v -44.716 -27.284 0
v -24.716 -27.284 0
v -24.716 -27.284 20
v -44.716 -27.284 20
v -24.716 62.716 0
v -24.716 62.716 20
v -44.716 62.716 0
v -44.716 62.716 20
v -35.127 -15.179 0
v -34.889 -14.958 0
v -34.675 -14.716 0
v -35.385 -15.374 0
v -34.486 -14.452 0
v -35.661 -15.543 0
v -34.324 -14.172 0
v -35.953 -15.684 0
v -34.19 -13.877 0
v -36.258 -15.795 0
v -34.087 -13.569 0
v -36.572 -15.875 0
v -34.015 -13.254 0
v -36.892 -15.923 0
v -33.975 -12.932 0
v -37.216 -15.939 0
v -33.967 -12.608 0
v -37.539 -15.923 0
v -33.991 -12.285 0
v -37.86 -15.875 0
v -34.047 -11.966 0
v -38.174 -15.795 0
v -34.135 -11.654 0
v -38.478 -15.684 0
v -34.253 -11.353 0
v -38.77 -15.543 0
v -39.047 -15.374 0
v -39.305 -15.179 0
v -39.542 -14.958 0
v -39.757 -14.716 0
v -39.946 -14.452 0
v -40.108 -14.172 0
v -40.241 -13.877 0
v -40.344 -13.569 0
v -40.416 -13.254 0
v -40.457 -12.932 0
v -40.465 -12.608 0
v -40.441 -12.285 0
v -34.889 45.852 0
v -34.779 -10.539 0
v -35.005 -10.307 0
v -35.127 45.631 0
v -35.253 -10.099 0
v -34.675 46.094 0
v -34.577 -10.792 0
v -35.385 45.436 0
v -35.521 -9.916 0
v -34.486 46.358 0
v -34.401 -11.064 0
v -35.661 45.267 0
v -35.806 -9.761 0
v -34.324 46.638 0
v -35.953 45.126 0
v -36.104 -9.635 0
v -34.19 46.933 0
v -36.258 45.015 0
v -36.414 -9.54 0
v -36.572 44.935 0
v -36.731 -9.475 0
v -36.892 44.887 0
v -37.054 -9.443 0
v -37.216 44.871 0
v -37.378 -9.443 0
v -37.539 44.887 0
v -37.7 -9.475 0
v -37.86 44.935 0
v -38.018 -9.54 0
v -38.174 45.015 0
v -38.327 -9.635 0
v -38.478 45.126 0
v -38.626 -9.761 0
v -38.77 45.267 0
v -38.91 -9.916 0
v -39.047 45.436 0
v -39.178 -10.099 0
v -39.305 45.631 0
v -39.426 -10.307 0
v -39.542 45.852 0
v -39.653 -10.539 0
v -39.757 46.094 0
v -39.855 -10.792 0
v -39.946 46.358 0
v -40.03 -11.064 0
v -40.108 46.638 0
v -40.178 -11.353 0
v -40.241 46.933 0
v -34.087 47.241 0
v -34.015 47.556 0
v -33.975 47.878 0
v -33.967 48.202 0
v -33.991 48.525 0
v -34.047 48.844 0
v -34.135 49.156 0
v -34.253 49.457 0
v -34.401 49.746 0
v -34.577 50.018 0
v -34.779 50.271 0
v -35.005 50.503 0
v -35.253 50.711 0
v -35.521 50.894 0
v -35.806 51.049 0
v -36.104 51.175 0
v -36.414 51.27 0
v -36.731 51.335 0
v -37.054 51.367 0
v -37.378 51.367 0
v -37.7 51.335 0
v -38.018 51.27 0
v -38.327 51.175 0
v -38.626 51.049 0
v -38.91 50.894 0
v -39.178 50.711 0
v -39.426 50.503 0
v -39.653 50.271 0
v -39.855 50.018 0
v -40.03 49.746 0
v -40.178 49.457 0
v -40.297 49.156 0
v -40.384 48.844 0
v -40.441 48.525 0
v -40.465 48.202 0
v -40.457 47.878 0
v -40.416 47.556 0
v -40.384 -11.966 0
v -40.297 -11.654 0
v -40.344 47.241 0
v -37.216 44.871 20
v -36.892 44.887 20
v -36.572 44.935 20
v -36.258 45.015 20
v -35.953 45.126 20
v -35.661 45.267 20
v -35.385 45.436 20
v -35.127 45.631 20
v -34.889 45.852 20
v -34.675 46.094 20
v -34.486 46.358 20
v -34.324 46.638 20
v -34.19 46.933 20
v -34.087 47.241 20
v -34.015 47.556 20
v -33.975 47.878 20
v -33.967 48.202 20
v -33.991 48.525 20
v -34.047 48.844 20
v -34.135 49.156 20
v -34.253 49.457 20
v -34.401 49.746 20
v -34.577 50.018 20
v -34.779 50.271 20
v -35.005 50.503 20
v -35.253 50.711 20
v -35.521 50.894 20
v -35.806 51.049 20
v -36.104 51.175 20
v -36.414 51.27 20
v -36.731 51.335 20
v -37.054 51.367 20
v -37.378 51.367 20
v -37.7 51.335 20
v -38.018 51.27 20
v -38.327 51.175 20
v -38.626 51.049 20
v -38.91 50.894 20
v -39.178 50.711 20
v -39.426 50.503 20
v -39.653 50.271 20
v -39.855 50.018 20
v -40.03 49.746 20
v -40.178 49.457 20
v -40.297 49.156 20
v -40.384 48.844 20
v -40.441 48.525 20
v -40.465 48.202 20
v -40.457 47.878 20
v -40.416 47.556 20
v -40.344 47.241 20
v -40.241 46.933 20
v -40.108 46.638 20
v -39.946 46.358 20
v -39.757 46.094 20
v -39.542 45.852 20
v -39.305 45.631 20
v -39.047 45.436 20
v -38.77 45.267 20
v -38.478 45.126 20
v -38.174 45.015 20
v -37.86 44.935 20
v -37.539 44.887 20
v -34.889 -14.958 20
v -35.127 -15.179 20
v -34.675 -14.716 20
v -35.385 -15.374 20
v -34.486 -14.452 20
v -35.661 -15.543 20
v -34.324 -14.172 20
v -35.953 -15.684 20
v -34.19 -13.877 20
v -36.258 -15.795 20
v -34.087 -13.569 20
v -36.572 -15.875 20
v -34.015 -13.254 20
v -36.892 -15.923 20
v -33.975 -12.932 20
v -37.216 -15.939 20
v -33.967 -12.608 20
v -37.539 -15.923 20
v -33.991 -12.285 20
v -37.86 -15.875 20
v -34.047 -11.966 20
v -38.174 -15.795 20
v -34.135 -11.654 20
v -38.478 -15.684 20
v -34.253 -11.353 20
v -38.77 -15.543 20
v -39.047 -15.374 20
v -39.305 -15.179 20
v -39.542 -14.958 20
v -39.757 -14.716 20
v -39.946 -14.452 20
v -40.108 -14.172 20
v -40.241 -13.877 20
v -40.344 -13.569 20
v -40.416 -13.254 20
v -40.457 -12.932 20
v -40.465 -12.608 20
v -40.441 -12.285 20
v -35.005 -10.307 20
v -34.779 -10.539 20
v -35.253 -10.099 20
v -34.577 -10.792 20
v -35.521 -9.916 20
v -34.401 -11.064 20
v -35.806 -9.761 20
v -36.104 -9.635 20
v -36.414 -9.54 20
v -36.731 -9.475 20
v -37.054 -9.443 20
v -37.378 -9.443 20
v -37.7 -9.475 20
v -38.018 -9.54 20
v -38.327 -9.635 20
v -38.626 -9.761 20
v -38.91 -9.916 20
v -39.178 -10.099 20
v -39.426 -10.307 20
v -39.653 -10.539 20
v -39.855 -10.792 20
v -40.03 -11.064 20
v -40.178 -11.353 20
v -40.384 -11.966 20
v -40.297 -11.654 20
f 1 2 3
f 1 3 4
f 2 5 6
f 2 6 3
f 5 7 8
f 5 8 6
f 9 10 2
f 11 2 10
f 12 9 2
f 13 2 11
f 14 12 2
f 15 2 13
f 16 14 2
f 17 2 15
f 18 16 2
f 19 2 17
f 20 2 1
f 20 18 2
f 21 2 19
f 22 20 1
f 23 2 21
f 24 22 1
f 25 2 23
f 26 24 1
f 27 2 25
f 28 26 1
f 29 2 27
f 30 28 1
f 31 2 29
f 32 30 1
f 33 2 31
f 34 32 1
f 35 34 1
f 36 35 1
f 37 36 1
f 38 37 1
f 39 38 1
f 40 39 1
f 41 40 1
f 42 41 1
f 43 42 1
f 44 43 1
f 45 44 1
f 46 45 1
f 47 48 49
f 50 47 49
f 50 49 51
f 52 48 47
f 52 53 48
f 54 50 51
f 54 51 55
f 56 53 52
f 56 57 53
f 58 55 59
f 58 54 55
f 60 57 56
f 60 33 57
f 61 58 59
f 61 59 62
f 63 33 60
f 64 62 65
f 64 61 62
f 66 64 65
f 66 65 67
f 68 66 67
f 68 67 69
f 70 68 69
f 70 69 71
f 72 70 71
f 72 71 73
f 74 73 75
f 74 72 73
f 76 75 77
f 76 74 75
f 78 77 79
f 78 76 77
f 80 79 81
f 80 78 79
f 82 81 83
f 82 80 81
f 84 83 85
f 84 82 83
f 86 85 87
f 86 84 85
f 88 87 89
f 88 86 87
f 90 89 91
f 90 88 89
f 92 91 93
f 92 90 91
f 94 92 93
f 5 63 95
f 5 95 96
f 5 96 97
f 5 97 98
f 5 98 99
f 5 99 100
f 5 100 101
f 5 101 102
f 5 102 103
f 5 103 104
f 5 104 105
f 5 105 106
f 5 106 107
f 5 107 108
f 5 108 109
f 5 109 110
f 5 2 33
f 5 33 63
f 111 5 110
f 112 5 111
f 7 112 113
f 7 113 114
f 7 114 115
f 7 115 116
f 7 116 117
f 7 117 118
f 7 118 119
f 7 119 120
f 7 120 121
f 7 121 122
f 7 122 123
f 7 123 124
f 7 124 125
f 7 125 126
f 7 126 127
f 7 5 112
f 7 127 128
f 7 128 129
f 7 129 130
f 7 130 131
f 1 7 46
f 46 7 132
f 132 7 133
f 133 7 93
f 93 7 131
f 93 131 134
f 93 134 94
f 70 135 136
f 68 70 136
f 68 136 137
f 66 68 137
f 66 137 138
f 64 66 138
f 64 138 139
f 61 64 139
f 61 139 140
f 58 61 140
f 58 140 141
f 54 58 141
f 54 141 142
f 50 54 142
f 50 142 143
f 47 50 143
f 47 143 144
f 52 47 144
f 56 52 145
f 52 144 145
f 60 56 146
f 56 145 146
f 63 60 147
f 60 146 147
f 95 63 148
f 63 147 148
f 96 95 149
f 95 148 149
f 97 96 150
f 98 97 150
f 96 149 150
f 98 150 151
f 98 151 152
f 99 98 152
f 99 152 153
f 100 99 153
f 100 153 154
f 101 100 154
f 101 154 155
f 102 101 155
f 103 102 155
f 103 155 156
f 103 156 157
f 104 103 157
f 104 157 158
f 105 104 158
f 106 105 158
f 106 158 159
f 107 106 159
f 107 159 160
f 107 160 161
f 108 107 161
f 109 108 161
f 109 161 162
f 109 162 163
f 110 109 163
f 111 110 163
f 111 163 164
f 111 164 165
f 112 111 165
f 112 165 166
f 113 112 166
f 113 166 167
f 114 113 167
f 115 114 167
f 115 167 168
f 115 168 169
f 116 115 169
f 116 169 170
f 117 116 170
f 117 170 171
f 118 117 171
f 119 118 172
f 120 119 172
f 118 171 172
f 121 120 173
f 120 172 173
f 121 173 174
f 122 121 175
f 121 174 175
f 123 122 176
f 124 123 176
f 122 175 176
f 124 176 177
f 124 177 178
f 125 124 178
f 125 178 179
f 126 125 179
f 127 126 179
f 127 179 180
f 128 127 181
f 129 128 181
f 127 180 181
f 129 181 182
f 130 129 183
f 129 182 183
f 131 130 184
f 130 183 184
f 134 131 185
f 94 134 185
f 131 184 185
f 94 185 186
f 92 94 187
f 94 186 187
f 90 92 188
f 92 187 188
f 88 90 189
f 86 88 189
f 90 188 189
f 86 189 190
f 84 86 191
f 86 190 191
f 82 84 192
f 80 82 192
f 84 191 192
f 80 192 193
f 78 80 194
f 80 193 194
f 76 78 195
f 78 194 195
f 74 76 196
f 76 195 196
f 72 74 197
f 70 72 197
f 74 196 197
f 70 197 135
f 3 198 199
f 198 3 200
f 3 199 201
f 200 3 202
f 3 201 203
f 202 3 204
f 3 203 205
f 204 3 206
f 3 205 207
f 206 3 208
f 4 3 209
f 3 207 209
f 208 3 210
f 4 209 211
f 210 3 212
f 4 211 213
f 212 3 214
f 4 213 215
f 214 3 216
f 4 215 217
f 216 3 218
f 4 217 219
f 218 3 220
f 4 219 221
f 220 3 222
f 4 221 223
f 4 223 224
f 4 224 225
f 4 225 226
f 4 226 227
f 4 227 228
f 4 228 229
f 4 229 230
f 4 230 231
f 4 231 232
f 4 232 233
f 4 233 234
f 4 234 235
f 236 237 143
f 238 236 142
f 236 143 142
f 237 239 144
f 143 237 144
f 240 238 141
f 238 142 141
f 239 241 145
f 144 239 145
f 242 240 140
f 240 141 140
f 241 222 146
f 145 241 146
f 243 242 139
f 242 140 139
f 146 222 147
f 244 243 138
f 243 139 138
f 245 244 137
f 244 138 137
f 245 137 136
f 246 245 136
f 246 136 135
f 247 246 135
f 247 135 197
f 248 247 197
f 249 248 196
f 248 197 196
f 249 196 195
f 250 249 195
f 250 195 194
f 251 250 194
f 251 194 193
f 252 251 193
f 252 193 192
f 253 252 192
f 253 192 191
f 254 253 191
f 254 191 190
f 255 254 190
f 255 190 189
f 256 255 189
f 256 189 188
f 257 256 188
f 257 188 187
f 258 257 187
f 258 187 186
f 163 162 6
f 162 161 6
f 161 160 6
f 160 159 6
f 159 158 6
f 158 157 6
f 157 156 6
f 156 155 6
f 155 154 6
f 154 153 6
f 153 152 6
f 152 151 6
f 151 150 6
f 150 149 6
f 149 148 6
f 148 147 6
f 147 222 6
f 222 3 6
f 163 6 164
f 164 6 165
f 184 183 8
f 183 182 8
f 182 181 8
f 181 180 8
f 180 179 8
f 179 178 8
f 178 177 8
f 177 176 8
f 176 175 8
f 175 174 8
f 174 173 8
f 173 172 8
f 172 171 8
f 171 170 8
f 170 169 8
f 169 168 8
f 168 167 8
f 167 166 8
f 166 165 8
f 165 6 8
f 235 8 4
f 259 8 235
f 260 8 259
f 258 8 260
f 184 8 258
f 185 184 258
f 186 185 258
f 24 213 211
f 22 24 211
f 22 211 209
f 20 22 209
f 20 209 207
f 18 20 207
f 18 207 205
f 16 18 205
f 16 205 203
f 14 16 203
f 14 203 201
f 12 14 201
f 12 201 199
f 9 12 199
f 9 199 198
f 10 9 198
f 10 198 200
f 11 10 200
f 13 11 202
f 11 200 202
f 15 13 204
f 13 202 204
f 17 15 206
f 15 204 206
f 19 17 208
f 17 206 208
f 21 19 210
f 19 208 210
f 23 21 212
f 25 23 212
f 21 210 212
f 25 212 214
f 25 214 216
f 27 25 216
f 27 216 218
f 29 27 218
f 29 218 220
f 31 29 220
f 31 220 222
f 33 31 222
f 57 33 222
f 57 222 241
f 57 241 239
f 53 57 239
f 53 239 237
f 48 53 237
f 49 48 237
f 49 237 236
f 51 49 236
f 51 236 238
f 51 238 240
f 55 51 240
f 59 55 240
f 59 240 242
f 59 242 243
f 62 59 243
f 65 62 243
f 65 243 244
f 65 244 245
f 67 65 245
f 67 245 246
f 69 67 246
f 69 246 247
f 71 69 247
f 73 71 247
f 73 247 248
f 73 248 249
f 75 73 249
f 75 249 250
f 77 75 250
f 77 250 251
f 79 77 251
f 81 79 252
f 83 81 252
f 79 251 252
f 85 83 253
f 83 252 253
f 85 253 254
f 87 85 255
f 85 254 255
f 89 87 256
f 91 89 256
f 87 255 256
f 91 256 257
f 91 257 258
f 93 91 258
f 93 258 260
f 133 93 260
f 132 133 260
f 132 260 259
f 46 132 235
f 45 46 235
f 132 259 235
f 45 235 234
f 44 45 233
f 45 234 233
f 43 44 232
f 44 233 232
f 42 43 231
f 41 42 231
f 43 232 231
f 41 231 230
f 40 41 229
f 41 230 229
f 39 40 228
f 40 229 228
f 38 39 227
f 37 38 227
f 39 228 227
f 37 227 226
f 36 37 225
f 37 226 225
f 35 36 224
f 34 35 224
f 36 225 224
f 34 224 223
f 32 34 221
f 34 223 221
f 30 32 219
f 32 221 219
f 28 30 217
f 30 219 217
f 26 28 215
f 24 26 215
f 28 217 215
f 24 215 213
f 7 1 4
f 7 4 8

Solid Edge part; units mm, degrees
sketch "Sketch1" plane through (0, 0, 0) normal (0, 0, 1) x (1, 0, 0)
  line L0 (-44.7158, 62.7158) -> (-24.7158, 62.7158)
  line L1 (-24.7158, 62.7158) -> (-24.7158, -27.2842)
  line L2 (-24.7158, -27.2842) -> (-44.7158, -27.2842)
  line L3 (-44.7158, -27.2842) -> (-44.7158, 62.7158)
  dimension "D1" = 20
  dimension "D2" = 90
extrude "Protrusion1" add sketch "Sketch1" along normal blind 20
hole "Hole_1" at (-37.2158, -12.6892, 20) direction (0, 0, -1) diameter 6.5 end up to next
hole "Hole1" at (-37.2158, 48.1208, 20) direction (0, 0, -1) diameter 6.5 end up to next
properties material "Aluminum, 6061-T6"
